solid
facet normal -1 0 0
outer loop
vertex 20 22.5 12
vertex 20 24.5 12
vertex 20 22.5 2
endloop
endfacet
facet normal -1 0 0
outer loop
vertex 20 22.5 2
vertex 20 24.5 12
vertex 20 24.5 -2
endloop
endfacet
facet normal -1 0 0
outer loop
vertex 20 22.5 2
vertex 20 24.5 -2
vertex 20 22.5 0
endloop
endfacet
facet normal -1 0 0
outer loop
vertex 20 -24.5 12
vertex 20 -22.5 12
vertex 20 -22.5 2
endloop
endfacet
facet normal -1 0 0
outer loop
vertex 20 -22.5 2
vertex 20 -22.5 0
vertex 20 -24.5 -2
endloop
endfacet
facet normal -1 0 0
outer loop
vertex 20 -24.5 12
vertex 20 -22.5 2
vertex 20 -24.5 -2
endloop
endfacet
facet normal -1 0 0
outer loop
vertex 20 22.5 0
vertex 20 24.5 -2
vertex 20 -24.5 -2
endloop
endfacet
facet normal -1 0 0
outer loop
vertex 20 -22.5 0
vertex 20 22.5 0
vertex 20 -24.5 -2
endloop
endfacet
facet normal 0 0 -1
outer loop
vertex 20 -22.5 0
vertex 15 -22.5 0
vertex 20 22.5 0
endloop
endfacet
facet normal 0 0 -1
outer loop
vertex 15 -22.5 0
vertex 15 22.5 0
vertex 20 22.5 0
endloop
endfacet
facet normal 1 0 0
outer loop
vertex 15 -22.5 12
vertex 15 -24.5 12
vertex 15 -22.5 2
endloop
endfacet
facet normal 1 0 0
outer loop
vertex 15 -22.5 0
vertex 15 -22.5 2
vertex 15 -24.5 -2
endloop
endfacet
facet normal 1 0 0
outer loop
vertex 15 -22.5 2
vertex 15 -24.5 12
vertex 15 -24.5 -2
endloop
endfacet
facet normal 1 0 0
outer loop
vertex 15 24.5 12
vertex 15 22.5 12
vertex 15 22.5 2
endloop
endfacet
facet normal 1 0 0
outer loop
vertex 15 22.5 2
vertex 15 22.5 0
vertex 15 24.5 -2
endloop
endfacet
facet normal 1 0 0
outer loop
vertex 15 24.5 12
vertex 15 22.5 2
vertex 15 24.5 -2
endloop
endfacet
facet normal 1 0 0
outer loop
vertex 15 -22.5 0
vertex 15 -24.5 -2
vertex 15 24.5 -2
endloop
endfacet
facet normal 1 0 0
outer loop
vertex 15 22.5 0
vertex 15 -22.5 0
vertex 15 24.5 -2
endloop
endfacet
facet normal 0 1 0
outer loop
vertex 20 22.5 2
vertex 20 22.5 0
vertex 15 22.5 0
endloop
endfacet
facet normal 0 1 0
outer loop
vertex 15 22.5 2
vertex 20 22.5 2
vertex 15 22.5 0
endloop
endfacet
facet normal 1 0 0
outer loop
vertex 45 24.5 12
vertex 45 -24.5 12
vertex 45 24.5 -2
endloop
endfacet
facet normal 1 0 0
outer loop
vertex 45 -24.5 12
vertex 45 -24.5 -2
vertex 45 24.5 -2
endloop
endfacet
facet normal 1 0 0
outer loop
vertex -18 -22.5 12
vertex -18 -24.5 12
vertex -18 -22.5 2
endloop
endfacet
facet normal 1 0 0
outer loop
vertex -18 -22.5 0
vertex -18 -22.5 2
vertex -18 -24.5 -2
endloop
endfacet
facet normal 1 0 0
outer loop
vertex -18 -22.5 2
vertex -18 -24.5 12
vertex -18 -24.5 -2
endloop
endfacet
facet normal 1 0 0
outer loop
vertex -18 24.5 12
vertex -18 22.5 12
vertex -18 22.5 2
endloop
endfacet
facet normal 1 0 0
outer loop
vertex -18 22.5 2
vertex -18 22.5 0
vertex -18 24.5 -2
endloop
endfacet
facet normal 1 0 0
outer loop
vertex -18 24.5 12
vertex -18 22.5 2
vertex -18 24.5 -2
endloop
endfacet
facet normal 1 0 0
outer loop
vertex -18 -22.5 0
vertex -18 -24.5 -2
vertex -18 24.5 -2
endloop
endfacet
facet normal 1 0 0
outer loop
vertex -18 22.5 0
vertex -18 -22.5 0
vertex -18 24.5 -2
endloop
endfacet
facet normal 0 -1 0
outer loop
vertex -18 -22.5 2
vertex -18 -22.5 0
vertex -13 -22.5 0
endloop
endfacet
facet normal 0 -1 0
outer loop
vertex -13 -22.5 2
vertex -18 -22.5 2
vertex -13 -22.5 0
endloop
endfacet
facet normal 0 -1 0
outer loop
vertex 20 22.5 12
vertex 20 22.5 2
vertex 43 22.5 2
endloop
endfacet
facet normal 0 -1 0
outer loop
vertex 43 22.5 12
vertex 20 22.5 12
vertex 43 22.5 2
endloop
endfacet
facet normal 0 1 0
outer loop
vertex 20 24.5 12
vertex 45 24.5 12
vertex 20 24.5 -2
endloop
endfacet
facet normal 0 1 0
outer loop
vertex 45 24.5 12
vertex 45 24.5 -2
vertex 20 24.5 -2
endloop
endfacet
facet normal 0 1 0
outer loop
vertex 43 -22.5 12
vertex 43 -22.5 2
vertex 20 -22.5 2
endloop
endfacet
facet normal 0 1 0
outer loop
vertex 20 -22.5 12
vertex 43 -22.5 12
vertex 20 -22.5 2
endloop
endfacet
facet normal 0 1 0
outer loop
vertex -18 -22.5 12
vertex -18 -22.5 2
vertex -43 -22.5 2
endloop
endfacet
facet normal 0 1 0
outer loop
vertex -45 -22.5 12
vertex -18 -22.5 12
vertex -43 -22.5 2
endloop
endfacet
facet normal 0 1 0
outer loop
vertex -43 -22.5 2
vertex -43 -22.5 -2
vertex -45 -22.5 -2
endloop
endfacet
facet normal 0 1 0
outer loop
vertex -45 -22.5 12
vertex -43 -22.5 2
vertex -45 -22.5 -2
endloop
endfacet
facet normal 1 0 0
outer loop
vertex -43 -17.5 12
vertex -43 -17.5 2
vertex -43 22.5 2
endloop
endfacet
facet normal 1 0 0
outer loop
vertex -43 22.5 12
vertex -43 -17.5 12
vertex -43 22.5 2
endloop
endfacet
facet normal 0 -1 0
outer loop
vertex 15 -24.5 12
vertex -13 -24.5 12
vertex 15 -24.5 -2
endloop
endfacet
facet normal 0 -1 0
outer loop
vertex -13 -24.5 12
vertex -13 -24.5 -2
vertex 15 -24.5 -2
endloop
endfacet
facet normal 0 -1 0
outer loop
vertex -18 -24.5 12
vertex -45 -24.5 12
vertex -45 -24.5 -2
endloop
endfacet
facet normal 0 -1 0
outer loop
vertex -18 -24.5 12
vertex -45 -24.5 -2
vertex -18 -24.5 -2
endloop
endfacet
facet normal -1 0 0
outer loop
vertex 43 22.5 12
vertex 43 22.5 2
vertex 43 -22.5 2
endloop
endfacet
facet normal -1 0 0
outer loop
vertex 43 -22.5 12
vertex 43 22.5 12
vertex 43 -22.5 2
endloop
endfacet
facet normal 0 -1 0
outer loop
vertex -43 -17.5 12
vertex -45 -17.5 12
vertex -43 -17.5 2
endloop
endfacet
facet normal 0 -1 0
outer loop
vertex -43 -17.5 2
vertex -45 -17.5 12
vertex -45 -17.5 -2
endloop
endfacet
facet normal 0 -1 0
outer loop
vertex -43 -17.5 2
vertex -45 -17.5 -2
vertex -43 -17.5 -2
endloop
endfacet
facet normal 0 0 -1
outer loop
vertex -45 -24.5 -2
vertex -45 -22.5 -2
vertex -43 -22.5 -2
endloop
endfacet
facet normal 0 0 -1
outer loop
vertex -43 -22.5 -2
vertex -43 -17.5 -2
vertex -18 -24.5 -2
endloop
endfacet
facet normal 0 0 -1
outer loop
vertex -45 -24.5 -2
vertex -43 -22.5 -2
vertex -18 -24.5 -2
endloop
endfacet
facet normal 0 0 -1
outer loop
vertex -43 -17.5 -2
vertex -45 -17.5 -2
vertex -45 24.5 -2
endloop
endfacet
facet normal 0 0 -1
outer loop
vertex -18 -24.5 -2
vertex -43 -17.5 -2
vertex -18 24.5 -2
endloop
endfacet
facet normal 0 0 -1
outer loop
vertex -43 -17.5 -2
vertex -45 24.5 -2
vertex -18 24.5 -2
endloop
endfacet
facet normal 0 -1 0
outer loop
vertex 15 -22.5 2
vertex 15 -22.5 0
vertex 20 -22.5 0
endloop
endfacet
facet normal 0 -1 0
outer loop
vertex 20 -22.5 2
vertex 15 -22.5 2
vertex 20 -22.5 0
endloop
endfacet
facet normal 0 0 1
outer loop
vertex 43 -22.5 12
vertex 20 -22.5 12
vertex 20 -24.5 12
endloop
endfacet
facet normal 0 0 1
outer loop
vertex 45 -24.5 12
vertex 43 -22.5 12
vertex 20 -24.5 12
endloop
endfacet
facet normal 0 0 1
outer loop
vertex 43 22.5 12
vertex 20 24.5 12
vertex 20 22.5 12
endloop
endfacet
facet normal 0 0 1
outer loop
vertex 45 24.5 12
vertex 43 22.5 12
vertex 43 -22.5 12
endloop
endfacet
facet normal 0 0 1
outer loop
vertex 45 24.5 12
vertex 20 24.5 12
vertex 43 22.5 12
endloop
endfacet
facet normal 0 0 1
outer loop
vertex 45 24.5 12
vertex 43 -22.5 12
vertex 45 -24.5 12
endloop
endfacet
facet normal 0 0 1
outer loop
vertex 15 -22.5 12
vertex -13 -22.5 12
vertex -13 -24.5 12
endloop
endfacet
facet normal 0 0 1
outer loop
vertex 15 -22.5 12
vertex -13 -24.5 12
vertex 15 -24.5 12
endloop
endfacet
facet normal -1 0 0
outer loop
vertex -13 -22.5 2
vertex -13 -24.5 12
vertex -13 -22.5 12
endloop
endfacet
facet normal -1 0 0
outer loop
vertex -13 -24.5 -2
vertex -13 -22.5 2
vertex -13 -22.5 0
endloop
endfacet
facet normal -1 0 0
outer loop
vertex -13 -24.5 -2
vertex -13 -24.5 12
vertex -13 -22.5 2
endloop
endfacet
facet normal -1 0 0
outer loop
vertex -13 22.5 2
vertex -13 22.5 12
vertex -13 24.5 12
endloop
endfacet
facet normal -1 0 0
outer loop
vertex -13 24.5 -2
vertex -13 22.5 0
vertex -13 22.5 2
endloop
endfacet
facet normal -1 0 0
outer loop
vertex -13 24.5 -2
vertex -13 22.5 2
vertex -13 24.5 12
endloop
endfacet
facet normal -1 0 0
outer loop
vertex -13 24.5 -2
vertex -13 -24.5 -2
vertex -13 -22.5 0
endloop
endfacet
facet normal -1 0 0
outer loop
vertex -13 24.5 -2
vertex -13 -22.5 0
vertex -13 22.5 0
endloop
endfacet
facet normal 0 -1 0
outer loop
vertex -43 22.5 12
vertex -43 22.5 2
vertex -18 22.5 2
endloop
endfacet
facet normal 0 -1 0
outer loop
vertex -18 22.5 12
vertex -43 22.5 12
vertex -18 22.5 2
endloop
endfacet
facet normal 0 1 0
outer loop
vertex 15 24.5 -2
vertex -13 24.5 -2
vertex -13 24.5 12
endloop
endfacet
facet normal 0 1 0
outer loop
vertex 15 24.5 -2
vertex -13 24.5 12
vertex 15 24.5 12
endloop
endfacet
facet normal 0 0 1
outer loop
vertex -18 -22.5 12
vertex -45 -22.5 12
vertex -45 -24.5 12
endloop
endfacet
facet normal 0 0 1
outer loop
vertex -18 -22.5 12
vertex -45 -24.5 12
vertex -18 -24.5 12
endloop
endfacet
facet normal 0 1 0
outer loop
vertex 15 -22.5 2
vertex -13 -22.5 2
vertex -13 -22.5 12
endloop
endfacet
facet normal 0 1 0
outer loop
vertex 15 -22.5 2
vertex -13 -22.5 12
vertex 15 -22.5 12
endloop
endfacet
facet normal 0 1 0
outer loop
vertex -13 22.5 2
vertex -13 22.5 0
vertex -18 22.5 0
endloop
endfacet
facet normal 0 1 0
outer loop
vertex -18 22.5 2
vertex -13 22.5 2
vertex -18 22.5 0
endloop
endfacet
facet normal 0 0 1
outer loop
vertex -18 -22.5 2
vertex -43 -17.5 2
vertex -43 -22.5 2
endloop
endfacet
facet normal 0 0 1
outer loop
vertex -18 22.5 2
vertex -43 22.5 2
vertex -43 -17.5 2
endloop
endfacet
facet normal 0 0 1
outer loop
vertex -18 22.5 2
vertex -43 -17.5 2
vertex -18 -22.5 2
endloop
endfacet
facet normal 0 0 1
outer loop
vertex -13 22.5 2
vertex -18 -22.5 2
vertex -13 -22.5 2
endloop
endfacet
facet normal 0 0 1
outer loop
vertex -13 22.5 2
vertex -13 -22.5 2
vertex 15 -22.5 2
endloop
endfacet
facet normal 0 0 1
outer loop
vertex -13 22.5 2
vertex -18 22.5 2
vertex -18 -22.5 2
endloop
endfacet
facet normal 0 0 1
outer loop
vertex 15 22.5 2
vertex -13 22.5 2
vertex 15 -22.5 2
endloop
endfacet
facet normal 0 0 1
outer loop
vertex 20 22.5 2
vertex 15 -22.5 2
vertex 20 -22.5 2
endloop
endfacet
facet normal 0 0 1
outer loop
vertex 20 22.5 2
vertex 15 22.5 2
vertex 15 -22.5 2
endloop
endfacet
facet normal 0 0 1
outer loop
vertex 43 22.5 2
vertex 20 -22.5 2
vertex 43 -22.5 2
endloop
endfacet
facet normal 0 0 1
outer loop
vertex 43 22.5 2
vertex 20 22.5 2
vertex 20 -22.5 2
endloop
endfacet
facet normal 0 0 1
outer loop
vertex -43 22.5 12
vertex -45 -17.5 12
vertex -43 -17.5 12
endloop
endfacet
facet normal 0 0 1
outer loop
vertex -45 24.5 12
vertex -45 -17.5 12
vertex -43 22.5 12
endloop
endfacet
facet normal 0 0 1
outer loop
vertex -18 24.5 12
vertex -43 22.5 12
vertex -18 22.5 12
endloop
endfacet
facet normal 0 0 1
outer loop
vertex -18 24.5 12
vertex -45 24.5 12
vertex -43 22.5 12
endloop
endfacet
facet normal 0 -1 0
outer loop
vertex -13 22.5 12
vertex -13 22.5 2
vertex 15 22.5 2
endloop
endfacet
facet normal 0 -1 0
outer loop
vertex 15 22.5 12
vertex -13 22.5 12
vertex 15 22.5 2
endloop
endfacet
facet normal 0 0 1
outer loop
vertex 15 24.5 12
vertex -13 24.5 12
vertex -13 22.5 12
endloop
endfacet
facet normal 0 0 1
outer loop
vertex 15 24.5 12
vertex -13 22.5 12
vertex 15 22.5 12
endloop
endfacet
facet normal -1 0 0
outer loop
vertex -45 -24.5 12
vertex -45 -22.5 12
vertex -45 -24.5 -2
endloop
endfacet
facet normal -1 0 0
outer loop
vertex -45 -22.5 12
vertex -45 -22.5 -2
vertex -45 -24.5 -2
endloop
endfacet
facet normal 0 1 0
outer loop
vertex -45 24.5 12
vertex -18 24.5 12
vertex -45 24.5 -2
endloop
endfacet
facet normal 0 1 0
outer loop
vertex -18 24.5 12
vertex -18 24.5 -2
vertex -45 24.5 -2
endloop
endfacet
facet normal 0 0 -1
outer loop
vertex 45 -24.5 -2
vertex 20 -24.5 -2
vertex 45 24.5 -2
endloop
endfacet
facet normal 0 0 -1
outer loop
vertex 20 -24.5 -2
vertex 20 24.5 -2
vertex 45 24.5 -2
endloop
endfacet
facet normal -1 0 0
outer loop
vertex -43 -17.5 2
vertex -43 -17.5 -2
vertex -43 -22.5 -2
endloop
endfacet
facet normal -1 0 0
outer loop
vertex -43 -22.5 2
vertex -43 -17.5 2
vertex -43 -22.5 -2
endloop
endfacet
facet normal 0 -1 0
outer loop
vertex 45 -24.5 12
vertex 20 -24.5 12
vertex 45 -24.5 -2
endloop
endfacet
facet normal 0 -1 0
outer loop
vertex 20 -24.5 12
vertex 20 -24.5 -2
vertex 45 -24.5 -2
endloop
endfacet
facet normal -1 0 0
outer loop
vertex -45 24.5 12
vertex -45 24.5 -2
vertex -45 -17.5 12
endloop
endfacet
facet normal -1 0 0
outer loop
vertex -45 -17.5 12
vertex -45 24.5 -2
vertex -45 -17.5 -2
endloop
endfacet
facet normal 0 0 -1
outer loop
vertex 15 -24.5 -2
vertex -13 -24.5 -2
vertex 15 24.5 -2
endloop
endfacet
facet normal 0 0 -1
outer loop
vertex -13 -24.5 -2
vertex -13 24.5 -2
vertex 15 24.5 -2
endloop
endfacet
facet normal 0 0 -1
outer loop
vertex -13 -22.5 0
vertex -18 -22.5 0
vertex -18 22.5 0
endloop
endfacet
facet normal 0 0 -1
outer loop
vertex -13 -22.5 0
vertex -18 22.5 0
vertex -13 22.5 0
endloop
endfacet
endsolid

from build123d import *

# Parameters (mm, degrees)
F1_DEPTH = 2
F0_W     = 28.0000002682
F0_H     = 45
F0_H_2   = 2
F0_W_2   = 23
F0_W_3   = 4.9999997318
F0_W_4   = 5
F2_DEPTH = 2
F3_DEPTH = 12


with BuildPart() as f1:
    # F0 (on Top) → F1 (new body)
    with BuildSketch(Plane.XY):
        Polygon((-18, 22.5), (-43, 22.5), (-43, -17.5), (-43, -22.5), (-18, -22.5), align=None)
        Polygon((-18, -24.5), (-18, -22.5), (-43, -22.5), (-45, -22.5), (-45, -24.5), align=None)
        Polygon((-43, -17.5), (-43, 22.5), (-18, 22.5), (-18, 24.5), (-45, 24.5), (-45, -17.5), align=None)
    extrude(amount=-F1_DEPTH)



with BuildPart() as f1b:
    # F0 (on Top) → F1, piece 2 (new body)
    with BuildSketch(Plane.XY):
        with Locations((0.9999998659, 0)):
            Rectangle(F0_W, F0_H)
        with Locations((0.9999998659, -23.5)):
            Rectangle(F0_W, F0_H_2)
        with Locations((0.9999998659, 23.5)):
            Rectangle(F0_W, F0_H_2)
    extrude(amount=-F1_DEPTH)


with BuildPart() as f1c:
    # F0 (on Top) → F1, piece 3 (new body)
    with BuildSketch(Plane.XY):
        with Locations((31.5, 0)):
            Rectangle(F0_W_2, F0_H)
        Polygon((20, 24.5), (20, 22.5), (43, 22.5), (43, -22.5), (20, -22.5), (20, -24.5), (45, -24.5), (45, 24.5), align=None)
    extrude(amount=-F1_DEPTH)


with BuildPart() as f1_1:
    add(f1.part)

    add(f1b.part)  # F2 merges F1b

    add(f1c.part)  # F2 merges F1c
    # F0 (on Top) → F2 (join)
    with BuildSketch(Plane.XY):
        with Locations((31.5, 0)):
            Rectangle(F0_W_2, F0_H)
        with Locations((0.9999998659, 0)):
            Rectangle(F0_W, F0_H)
        Polygon((-18, 22.5), (-43, 22.5), (-43, -17.5), (-43, -22.5), (-18, -22.5), align=None)
        with Locations((-15.5000001341, 0)):
            Rectangle(F0_W_3, F0_H)
        with Locations((17.5, 0)):
            Rectangle(F0_W_4, F0_H)
    extrude(amount=F2_DEPTH)

    # F0 (on Top) → F3 (join)
    with BuildSketch(Plane.XY):
        Polygon((-43, -17.5), (-43, 22.5), (-18, 22.5), (-18, 24.5), (-45, 24.5), (-45, -17.5), align=None)
        Polygon((-18, -24.5), (-18, -22.5), (-43, -22.5), (-45, -22.5), (-45, -24.5), align=None)
        with Locations((0.9999998659, -23.5)):
            Rectangle(F0_W, F0_H_2)
        with Locations((0.9999998659, 23.5)):
            Rectangle(F0_W, F0_H_2)
        Polygon((20, 24.5), (20, 22.5), (43, 22.5), (43, -22.5), (20, -22.5), (20, -24.5), (45, -24.5), (45, 24.5), align=None)
    extrude(amount=F3_DEPTH)


solid = f1_1.part
